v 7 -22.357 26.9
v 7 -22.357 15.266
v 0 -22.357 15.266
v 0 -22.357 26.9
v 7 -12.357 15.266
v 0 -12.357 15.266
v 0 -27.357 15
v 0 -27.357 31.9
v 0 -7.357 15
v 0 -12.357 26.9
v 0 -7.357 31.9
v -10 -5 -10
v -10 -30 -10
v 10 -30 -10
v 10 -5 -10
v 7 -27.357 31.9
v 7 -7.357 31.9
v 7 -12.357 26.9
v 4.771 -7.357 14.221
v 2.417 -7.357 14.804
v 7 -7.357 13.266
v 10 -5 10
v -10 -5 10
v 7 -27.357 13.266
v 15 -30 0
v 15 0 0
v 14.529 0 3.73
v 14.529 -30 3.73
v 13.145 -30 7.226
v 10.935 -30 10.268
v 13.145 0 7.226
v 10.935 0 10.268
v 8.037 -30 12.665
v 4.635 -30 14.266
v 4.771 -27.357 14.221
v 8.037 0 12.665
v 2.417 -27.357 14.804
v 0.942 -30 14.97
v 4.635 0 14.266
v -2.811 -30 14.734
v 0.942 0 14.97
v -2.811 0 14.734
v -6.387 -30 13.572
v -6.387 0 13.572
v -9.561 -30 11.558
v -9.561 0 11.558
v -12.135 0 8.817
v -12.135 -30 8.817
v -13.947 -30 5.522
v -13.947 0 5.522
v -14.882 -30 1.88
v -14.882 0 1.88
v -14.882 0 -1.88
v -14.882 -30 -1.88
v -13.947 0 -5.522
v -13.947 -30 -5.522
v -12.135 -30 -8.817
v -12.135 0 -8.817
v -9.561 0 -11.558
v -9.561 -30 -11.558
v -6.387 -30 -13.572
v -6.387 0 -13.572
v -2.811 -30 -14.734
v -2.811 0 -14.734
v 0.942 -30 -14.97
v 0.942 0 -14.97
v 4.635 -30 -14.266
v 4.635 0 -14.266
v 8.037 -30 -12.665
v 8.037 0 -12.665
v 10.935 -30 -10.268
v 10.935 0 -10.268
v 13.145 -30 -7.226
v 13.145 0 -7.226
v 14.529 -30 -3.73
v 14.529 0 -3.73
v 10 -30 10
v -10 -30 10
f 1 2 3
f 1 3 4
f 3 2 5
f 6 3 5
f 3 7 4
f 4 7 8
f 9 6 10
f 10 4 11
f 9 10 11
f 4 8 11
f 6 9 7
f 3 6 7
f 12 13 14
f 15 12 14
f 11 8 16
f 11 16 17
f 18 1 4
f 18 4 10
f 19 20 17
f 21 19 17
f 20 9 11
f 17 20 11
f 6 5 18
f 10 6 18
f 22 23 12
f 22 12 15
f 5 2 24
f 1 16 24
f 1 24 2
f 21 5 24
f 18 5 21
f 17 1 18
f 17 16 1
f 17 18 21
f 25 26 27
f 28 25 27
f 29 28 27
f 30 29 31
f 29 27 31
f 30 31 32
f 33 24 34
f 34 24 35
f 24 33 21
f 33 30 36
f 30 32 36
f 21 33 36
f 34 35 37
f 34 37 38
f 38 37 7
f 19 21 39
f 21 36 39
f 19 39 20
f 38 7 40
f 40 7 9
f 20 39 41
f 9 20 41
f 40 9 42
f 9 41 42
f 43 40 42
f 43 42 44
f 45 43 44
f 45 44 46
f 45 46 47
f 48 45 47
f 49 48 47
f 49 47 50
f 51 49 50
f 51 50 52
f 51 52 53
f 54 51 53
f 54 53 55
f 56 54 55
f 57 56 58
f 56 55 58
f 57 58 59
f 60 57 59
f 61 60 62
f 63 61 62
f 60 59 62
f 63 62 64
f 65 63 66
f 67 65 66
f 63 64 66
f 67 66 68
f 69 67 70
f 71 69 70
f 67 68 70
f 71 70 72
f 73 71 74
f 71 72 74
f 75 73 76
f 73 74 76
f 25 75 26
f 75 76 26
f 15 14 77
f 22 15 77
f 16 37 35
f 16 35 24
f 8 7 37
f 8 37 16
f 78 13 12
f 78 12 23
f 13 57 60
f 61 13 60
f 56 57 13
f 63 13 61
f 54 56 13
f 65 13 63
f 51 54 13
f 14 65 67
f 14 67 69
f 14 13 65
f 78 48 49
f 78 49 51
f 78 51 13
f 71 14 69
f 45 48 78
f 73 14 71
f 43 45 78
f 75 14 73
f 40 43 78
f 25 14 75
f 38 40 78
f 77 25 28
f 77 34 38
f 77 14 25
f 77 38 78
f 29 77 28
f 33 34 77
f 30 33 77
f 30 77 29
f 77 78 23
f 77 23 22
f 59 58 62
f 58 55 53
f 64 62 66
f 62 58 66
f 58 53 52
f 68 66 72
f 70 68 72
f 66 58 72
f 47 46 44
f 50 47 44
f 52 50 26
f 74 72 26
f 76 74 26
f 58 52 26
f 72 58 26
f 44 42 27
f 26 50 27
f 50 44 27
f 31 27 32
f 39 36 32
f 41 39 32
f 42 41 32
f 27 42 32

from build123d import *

# Parameters (mm, degrees)
F0_R     = 15
F1_DEPTH = 30
F2_W     = 20
F2_H     = 20
F3_DEPTH = 25
F4_W     = 20
F4_H     = 20
F5_DEPTH = 7
F6_W     = 10
F6_H     = 11.633402
F7_DEPTH = 20


with BuildPart() as f1:
    # F0 (on Front) → F1 (new body)
    with BuildSketch(Plane.XZ):
        Circle(F0_R)
    extrude(amount=F1_DEPTH)

    # F2 (on face) → F3 (cut)
    with BuildSketch(Plane.XZ.offset(30)):
        Rectangle(F2_W, F2_H)
    extrude(amount=-F3_DEPTH, mode=Mode.SUBTRACT)

    # F4 (on Right) → F5 (join)
    with BuildSketch(Plane.YZ):
        with Locations((-17.3568, 21.899901)):
            Rectangle(F4_W, F4_H)
    extrude(amount=F5_DEPTH)

    # F6 (on face) → F7 (cut)
    with BuildSketch(Plane.YZ.offset(7)):
        with Locations((-17.3568, 21.0832)):
            Rectangle(F6_W, F6_H)
    extrude(amount=-F7_DEPTH, mode=Mode.SUBTRACT)


solid = f1.part
